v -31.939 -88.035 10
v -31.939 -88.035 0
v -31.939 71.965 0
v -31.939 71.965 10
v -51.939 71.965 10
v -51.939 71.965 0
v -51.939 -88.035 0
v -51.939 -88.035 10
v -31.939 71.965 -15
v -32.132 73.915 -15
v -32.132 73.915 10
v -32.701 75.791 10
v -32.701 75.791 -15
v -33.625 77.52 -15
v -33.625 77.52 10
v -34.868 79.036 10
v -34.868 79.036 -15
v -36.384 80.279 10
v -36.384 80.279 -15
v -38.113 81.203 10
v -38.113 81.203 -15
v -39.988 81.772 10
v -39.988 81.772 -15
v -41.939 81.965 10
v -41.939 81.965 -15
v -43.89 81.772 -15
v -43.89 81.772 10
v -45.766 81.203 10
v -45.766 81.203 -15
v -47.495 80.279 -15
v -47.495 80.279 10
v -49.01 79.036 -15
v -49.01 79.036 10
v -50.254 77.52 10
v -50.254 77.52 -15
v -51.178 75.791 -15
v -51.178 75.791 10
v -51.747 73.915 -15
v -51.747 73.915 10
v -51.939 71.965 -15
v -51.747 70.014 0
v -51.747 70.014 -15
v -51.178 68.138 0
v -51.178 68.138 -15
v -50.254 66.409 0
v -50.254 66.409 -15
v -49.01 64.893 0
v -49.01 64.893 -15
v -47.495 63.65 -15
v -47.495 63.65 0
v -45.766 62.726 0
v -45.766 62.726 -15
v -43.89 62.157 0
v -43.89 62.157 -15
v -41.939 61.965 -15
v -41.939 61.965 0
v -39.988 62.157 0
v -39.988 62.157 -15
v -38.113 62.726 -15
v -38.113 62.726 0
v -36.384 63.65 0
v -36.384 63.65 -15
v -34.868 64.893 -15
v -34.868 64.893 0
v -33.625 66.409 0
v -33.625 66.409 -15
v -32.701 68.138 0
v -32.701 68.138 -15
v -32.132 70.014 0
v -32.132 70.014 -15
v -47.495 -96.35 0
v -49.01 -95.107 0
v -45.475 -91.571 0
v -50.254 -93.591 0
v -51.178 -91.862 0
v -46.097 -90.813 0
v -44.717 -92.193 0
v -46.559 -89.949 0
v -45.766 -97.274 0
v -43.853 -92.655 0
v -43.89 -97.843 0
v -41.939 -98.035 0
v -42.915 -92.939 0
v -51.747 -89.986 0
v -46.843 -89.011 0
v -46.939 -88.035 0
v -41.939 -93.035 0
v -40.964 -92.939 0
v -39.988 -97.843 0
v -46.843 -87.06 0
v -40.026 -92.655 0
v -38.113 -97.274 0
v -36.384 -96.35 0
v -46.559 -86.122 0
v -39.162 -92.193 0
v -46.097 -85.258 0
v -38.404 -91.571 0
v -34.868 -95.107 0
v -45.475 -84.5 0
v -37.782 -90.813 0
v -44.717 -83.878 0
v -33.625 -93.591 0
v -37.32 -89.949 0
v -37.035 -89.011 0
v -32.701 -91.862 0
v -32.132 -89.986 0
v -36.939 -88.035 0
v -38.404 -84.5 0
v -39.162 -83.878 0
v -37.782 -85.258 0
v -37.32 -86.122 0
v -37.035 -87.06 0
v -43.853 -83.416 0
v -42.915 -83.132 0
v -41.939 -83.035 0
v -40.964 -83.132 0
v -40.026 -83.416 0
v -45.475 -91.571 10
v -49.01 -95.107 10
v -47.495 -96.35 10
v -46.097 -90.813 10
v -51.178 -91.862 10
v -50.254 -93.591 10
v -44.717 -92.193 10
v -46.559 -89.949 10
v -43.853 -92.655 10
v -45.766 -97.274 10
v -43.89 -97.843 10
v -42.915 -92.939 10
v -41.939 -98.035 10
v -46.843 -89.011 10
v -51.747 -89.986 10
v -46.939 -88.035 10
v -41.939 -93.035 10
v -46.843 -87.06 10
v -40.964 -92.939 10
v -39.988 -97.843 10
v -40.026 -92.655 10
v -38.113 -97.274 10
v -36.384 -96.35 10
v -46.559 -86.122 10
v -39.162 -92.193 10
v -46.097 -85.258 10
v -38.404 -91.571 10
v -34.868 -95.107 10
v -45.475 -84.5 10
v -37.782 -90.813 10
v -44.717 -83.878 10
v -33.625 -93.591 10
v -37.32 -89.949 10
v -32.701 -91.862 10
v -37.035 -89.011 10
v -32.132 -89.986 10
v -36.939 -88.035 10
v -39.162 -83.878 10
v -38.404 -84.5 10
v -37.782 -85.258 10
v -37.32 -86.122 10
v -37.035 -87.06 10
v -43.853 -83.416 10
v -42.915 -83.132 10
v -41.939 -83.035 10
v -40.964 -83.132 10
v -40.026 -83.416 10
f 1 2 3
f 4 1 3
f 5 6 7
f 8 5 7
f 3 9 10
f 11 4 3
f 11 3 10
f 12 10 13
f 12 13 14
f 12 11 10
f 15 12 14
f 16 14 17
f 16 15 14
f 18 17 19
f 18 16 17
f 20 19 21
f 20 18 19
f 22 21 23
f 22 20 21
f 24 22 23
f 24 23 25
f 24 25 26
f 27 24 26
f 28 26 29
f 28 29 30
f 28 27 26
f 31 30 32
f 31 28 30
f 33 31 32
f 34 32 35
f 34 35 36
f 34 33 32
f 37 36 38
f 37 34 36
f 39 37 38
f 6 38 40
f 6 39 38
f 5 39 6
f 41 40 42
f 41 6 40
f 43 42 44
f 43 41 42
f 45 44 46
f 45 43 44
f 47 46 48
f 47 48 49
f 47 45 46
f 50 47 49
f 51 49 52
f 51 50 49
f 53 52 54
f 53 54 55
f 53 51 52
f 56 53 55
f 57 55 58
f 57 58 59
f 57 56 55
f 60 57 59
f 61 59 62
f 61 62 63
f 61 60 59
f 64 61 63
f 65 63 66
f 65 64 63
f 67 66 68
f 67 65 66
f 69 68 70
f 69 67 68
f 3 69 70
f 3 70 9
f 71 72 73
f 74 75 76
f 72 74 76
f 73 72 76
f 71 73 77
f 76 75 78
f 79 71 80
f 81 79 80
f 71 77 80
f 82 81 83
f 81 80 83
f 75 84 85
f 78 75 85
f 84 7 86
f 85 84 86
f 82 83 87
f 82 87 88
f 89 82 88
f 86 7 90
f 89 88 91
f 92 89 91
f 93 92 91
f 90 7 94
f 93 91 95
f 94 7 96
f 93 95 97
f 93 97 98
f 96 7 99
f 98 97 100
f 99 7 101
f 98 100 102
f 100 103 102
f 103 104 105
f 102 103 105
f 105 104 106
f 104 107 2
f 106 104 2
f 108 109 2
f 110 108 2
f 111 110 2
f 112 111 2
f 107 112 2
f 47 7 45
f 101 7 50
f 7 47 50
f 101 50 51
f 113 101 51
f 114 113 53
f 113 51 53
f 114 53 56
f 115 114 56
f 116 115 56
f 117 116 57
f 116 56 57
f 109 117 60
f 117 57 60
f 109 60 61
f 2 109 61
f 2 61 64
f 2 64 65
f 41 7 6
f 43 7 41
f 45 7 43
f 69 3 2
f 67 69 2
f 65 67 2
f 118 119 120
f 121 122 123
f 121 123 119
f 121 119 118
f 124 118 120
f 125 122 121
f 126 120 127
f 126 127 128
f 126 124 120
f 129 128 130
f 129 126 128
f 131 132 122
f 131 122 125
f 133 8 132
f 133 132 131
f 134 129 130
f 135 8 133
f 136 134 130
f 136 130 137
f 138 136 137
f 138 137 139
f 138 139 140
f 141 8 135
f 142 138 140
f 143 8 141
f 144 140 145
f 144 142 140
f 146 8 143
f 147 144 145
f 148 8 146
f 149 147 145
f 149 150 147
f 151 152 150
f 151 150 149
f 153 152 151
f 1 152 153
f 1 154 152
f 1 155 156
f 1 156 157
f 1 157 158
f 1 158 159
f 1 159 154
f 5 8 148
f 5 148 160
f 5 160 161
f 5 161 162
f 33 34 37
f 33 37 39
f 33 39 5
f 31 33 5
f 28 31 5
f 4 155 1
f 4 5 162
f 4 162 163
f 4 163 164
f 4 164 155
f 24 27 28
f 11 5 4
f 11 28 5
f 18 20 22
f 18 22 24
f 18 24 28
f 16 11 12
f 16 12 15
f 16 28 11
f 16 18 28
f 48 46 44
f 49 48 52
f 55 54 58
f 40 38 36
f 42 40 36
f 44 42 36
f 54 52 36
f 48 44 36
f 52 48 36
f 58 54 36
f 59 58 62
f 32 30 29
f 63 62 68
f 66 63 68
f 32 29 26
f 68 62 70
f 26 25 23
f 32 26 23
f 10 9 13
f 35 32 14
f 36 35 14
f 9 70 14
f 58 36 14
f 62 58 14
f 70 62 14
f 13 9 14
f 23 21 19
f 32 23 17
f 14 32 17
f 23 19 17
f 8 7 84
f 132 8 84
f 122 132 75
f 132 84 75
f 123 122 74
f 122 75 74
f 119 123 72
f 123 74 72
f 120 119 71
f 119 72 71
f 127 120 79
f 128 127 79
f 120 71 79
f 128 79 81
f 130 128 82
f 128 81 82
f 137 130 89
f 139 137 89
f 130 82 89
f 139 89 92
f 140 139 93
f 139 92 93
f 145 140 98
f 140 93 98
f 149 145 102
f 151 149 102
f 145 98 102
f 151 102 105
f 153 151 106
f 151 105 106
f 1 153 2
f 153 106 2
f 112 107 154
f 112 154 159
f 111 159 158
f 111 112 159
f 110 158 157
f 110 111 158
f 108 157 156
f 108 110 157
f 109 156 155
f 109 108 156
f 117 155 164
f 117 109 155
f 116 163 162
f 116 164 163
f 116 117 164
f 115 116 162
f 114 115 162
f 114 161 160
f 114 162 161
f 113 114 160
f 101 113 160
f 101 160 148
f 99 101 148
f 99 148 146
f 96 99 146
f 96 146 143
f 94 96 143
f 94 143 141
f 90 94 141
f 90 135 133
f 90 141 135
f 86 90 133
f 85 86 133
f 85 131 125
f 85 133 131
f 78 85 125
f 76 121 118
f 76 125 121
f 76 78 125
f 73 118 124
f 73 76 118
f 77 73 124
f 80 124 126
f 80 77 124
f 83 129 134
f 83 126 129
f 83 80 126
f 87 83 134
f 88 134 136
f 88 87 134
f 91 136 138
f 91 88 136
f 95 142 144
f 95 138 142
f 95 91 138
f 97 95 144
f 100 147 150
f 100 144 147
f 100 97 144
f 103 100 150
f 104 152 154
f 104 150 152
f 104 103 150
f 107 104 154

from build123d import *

# Parameters (mm, degrees)
RESSALTO_EXTRUS_O1_DEPTH   = 10
CORTE_EXTRUS_O1_DEPTH      = 112.394113732
CORTE_EXTRUS_O1_DEPTH_BACK = 112.394113732
ESBO_O2_R                  = 5
ESBO_O4_R                  = 10
RESSALTO_EXTRUS_O2_DEPTH   = 25


with BuildPart() as part:
    # Esboço1 → Ressalto-extrusão1 (new body)
    with BuildSketch(Plane.XY):
        with BuildLine():
            Line((-51.939383922, 71.964552472), (-51.939383922, -88.035447528))
            ThreePointArc((-51.939383922, -88.035447528), (-41.939383922, -98.035447528), (-31.939383922, -88.035447528))
            Line((-31.939383922, -88.035447528), (-31.939383922, 71.964552472))
            Line((-31.939383922, 71.964552472), (-51.939383922, 71.964552472))
        make_face()
    extrude(amount=RESSALTO_EXTRUS_O1_DEPTH)

    # Esboço2 → Corte-extrusão1 (cut, two sides: drawn at the far end of the back side and taken through both)
    with BuildSketch(Plane.XY.offset(10).offset(-CORTE_EXTRUS_O1_DEPTH_BACK)):
        with Locations((-41.939383922, -88.035447528)):
            Circle(ESBO_O2_R)
    extrude(amount=CORTE_EXTRUS_O1_DEPTH + CORTE_EXTRUS_O1_DEPTH_BACK, mode=Mode.SUBTRACT)

    # Esboço4 → Ressalto-extrusão2 (add)
    with BuildSketch(Plane.XY.offset(10)):
        with Locations((-41.939383922, 71.964552472)):
            Circle(ESBO_O4_R)
    extrude(amount=-RESSALTO_EXTRUS_O2_DEPTH)


solid = part.part
